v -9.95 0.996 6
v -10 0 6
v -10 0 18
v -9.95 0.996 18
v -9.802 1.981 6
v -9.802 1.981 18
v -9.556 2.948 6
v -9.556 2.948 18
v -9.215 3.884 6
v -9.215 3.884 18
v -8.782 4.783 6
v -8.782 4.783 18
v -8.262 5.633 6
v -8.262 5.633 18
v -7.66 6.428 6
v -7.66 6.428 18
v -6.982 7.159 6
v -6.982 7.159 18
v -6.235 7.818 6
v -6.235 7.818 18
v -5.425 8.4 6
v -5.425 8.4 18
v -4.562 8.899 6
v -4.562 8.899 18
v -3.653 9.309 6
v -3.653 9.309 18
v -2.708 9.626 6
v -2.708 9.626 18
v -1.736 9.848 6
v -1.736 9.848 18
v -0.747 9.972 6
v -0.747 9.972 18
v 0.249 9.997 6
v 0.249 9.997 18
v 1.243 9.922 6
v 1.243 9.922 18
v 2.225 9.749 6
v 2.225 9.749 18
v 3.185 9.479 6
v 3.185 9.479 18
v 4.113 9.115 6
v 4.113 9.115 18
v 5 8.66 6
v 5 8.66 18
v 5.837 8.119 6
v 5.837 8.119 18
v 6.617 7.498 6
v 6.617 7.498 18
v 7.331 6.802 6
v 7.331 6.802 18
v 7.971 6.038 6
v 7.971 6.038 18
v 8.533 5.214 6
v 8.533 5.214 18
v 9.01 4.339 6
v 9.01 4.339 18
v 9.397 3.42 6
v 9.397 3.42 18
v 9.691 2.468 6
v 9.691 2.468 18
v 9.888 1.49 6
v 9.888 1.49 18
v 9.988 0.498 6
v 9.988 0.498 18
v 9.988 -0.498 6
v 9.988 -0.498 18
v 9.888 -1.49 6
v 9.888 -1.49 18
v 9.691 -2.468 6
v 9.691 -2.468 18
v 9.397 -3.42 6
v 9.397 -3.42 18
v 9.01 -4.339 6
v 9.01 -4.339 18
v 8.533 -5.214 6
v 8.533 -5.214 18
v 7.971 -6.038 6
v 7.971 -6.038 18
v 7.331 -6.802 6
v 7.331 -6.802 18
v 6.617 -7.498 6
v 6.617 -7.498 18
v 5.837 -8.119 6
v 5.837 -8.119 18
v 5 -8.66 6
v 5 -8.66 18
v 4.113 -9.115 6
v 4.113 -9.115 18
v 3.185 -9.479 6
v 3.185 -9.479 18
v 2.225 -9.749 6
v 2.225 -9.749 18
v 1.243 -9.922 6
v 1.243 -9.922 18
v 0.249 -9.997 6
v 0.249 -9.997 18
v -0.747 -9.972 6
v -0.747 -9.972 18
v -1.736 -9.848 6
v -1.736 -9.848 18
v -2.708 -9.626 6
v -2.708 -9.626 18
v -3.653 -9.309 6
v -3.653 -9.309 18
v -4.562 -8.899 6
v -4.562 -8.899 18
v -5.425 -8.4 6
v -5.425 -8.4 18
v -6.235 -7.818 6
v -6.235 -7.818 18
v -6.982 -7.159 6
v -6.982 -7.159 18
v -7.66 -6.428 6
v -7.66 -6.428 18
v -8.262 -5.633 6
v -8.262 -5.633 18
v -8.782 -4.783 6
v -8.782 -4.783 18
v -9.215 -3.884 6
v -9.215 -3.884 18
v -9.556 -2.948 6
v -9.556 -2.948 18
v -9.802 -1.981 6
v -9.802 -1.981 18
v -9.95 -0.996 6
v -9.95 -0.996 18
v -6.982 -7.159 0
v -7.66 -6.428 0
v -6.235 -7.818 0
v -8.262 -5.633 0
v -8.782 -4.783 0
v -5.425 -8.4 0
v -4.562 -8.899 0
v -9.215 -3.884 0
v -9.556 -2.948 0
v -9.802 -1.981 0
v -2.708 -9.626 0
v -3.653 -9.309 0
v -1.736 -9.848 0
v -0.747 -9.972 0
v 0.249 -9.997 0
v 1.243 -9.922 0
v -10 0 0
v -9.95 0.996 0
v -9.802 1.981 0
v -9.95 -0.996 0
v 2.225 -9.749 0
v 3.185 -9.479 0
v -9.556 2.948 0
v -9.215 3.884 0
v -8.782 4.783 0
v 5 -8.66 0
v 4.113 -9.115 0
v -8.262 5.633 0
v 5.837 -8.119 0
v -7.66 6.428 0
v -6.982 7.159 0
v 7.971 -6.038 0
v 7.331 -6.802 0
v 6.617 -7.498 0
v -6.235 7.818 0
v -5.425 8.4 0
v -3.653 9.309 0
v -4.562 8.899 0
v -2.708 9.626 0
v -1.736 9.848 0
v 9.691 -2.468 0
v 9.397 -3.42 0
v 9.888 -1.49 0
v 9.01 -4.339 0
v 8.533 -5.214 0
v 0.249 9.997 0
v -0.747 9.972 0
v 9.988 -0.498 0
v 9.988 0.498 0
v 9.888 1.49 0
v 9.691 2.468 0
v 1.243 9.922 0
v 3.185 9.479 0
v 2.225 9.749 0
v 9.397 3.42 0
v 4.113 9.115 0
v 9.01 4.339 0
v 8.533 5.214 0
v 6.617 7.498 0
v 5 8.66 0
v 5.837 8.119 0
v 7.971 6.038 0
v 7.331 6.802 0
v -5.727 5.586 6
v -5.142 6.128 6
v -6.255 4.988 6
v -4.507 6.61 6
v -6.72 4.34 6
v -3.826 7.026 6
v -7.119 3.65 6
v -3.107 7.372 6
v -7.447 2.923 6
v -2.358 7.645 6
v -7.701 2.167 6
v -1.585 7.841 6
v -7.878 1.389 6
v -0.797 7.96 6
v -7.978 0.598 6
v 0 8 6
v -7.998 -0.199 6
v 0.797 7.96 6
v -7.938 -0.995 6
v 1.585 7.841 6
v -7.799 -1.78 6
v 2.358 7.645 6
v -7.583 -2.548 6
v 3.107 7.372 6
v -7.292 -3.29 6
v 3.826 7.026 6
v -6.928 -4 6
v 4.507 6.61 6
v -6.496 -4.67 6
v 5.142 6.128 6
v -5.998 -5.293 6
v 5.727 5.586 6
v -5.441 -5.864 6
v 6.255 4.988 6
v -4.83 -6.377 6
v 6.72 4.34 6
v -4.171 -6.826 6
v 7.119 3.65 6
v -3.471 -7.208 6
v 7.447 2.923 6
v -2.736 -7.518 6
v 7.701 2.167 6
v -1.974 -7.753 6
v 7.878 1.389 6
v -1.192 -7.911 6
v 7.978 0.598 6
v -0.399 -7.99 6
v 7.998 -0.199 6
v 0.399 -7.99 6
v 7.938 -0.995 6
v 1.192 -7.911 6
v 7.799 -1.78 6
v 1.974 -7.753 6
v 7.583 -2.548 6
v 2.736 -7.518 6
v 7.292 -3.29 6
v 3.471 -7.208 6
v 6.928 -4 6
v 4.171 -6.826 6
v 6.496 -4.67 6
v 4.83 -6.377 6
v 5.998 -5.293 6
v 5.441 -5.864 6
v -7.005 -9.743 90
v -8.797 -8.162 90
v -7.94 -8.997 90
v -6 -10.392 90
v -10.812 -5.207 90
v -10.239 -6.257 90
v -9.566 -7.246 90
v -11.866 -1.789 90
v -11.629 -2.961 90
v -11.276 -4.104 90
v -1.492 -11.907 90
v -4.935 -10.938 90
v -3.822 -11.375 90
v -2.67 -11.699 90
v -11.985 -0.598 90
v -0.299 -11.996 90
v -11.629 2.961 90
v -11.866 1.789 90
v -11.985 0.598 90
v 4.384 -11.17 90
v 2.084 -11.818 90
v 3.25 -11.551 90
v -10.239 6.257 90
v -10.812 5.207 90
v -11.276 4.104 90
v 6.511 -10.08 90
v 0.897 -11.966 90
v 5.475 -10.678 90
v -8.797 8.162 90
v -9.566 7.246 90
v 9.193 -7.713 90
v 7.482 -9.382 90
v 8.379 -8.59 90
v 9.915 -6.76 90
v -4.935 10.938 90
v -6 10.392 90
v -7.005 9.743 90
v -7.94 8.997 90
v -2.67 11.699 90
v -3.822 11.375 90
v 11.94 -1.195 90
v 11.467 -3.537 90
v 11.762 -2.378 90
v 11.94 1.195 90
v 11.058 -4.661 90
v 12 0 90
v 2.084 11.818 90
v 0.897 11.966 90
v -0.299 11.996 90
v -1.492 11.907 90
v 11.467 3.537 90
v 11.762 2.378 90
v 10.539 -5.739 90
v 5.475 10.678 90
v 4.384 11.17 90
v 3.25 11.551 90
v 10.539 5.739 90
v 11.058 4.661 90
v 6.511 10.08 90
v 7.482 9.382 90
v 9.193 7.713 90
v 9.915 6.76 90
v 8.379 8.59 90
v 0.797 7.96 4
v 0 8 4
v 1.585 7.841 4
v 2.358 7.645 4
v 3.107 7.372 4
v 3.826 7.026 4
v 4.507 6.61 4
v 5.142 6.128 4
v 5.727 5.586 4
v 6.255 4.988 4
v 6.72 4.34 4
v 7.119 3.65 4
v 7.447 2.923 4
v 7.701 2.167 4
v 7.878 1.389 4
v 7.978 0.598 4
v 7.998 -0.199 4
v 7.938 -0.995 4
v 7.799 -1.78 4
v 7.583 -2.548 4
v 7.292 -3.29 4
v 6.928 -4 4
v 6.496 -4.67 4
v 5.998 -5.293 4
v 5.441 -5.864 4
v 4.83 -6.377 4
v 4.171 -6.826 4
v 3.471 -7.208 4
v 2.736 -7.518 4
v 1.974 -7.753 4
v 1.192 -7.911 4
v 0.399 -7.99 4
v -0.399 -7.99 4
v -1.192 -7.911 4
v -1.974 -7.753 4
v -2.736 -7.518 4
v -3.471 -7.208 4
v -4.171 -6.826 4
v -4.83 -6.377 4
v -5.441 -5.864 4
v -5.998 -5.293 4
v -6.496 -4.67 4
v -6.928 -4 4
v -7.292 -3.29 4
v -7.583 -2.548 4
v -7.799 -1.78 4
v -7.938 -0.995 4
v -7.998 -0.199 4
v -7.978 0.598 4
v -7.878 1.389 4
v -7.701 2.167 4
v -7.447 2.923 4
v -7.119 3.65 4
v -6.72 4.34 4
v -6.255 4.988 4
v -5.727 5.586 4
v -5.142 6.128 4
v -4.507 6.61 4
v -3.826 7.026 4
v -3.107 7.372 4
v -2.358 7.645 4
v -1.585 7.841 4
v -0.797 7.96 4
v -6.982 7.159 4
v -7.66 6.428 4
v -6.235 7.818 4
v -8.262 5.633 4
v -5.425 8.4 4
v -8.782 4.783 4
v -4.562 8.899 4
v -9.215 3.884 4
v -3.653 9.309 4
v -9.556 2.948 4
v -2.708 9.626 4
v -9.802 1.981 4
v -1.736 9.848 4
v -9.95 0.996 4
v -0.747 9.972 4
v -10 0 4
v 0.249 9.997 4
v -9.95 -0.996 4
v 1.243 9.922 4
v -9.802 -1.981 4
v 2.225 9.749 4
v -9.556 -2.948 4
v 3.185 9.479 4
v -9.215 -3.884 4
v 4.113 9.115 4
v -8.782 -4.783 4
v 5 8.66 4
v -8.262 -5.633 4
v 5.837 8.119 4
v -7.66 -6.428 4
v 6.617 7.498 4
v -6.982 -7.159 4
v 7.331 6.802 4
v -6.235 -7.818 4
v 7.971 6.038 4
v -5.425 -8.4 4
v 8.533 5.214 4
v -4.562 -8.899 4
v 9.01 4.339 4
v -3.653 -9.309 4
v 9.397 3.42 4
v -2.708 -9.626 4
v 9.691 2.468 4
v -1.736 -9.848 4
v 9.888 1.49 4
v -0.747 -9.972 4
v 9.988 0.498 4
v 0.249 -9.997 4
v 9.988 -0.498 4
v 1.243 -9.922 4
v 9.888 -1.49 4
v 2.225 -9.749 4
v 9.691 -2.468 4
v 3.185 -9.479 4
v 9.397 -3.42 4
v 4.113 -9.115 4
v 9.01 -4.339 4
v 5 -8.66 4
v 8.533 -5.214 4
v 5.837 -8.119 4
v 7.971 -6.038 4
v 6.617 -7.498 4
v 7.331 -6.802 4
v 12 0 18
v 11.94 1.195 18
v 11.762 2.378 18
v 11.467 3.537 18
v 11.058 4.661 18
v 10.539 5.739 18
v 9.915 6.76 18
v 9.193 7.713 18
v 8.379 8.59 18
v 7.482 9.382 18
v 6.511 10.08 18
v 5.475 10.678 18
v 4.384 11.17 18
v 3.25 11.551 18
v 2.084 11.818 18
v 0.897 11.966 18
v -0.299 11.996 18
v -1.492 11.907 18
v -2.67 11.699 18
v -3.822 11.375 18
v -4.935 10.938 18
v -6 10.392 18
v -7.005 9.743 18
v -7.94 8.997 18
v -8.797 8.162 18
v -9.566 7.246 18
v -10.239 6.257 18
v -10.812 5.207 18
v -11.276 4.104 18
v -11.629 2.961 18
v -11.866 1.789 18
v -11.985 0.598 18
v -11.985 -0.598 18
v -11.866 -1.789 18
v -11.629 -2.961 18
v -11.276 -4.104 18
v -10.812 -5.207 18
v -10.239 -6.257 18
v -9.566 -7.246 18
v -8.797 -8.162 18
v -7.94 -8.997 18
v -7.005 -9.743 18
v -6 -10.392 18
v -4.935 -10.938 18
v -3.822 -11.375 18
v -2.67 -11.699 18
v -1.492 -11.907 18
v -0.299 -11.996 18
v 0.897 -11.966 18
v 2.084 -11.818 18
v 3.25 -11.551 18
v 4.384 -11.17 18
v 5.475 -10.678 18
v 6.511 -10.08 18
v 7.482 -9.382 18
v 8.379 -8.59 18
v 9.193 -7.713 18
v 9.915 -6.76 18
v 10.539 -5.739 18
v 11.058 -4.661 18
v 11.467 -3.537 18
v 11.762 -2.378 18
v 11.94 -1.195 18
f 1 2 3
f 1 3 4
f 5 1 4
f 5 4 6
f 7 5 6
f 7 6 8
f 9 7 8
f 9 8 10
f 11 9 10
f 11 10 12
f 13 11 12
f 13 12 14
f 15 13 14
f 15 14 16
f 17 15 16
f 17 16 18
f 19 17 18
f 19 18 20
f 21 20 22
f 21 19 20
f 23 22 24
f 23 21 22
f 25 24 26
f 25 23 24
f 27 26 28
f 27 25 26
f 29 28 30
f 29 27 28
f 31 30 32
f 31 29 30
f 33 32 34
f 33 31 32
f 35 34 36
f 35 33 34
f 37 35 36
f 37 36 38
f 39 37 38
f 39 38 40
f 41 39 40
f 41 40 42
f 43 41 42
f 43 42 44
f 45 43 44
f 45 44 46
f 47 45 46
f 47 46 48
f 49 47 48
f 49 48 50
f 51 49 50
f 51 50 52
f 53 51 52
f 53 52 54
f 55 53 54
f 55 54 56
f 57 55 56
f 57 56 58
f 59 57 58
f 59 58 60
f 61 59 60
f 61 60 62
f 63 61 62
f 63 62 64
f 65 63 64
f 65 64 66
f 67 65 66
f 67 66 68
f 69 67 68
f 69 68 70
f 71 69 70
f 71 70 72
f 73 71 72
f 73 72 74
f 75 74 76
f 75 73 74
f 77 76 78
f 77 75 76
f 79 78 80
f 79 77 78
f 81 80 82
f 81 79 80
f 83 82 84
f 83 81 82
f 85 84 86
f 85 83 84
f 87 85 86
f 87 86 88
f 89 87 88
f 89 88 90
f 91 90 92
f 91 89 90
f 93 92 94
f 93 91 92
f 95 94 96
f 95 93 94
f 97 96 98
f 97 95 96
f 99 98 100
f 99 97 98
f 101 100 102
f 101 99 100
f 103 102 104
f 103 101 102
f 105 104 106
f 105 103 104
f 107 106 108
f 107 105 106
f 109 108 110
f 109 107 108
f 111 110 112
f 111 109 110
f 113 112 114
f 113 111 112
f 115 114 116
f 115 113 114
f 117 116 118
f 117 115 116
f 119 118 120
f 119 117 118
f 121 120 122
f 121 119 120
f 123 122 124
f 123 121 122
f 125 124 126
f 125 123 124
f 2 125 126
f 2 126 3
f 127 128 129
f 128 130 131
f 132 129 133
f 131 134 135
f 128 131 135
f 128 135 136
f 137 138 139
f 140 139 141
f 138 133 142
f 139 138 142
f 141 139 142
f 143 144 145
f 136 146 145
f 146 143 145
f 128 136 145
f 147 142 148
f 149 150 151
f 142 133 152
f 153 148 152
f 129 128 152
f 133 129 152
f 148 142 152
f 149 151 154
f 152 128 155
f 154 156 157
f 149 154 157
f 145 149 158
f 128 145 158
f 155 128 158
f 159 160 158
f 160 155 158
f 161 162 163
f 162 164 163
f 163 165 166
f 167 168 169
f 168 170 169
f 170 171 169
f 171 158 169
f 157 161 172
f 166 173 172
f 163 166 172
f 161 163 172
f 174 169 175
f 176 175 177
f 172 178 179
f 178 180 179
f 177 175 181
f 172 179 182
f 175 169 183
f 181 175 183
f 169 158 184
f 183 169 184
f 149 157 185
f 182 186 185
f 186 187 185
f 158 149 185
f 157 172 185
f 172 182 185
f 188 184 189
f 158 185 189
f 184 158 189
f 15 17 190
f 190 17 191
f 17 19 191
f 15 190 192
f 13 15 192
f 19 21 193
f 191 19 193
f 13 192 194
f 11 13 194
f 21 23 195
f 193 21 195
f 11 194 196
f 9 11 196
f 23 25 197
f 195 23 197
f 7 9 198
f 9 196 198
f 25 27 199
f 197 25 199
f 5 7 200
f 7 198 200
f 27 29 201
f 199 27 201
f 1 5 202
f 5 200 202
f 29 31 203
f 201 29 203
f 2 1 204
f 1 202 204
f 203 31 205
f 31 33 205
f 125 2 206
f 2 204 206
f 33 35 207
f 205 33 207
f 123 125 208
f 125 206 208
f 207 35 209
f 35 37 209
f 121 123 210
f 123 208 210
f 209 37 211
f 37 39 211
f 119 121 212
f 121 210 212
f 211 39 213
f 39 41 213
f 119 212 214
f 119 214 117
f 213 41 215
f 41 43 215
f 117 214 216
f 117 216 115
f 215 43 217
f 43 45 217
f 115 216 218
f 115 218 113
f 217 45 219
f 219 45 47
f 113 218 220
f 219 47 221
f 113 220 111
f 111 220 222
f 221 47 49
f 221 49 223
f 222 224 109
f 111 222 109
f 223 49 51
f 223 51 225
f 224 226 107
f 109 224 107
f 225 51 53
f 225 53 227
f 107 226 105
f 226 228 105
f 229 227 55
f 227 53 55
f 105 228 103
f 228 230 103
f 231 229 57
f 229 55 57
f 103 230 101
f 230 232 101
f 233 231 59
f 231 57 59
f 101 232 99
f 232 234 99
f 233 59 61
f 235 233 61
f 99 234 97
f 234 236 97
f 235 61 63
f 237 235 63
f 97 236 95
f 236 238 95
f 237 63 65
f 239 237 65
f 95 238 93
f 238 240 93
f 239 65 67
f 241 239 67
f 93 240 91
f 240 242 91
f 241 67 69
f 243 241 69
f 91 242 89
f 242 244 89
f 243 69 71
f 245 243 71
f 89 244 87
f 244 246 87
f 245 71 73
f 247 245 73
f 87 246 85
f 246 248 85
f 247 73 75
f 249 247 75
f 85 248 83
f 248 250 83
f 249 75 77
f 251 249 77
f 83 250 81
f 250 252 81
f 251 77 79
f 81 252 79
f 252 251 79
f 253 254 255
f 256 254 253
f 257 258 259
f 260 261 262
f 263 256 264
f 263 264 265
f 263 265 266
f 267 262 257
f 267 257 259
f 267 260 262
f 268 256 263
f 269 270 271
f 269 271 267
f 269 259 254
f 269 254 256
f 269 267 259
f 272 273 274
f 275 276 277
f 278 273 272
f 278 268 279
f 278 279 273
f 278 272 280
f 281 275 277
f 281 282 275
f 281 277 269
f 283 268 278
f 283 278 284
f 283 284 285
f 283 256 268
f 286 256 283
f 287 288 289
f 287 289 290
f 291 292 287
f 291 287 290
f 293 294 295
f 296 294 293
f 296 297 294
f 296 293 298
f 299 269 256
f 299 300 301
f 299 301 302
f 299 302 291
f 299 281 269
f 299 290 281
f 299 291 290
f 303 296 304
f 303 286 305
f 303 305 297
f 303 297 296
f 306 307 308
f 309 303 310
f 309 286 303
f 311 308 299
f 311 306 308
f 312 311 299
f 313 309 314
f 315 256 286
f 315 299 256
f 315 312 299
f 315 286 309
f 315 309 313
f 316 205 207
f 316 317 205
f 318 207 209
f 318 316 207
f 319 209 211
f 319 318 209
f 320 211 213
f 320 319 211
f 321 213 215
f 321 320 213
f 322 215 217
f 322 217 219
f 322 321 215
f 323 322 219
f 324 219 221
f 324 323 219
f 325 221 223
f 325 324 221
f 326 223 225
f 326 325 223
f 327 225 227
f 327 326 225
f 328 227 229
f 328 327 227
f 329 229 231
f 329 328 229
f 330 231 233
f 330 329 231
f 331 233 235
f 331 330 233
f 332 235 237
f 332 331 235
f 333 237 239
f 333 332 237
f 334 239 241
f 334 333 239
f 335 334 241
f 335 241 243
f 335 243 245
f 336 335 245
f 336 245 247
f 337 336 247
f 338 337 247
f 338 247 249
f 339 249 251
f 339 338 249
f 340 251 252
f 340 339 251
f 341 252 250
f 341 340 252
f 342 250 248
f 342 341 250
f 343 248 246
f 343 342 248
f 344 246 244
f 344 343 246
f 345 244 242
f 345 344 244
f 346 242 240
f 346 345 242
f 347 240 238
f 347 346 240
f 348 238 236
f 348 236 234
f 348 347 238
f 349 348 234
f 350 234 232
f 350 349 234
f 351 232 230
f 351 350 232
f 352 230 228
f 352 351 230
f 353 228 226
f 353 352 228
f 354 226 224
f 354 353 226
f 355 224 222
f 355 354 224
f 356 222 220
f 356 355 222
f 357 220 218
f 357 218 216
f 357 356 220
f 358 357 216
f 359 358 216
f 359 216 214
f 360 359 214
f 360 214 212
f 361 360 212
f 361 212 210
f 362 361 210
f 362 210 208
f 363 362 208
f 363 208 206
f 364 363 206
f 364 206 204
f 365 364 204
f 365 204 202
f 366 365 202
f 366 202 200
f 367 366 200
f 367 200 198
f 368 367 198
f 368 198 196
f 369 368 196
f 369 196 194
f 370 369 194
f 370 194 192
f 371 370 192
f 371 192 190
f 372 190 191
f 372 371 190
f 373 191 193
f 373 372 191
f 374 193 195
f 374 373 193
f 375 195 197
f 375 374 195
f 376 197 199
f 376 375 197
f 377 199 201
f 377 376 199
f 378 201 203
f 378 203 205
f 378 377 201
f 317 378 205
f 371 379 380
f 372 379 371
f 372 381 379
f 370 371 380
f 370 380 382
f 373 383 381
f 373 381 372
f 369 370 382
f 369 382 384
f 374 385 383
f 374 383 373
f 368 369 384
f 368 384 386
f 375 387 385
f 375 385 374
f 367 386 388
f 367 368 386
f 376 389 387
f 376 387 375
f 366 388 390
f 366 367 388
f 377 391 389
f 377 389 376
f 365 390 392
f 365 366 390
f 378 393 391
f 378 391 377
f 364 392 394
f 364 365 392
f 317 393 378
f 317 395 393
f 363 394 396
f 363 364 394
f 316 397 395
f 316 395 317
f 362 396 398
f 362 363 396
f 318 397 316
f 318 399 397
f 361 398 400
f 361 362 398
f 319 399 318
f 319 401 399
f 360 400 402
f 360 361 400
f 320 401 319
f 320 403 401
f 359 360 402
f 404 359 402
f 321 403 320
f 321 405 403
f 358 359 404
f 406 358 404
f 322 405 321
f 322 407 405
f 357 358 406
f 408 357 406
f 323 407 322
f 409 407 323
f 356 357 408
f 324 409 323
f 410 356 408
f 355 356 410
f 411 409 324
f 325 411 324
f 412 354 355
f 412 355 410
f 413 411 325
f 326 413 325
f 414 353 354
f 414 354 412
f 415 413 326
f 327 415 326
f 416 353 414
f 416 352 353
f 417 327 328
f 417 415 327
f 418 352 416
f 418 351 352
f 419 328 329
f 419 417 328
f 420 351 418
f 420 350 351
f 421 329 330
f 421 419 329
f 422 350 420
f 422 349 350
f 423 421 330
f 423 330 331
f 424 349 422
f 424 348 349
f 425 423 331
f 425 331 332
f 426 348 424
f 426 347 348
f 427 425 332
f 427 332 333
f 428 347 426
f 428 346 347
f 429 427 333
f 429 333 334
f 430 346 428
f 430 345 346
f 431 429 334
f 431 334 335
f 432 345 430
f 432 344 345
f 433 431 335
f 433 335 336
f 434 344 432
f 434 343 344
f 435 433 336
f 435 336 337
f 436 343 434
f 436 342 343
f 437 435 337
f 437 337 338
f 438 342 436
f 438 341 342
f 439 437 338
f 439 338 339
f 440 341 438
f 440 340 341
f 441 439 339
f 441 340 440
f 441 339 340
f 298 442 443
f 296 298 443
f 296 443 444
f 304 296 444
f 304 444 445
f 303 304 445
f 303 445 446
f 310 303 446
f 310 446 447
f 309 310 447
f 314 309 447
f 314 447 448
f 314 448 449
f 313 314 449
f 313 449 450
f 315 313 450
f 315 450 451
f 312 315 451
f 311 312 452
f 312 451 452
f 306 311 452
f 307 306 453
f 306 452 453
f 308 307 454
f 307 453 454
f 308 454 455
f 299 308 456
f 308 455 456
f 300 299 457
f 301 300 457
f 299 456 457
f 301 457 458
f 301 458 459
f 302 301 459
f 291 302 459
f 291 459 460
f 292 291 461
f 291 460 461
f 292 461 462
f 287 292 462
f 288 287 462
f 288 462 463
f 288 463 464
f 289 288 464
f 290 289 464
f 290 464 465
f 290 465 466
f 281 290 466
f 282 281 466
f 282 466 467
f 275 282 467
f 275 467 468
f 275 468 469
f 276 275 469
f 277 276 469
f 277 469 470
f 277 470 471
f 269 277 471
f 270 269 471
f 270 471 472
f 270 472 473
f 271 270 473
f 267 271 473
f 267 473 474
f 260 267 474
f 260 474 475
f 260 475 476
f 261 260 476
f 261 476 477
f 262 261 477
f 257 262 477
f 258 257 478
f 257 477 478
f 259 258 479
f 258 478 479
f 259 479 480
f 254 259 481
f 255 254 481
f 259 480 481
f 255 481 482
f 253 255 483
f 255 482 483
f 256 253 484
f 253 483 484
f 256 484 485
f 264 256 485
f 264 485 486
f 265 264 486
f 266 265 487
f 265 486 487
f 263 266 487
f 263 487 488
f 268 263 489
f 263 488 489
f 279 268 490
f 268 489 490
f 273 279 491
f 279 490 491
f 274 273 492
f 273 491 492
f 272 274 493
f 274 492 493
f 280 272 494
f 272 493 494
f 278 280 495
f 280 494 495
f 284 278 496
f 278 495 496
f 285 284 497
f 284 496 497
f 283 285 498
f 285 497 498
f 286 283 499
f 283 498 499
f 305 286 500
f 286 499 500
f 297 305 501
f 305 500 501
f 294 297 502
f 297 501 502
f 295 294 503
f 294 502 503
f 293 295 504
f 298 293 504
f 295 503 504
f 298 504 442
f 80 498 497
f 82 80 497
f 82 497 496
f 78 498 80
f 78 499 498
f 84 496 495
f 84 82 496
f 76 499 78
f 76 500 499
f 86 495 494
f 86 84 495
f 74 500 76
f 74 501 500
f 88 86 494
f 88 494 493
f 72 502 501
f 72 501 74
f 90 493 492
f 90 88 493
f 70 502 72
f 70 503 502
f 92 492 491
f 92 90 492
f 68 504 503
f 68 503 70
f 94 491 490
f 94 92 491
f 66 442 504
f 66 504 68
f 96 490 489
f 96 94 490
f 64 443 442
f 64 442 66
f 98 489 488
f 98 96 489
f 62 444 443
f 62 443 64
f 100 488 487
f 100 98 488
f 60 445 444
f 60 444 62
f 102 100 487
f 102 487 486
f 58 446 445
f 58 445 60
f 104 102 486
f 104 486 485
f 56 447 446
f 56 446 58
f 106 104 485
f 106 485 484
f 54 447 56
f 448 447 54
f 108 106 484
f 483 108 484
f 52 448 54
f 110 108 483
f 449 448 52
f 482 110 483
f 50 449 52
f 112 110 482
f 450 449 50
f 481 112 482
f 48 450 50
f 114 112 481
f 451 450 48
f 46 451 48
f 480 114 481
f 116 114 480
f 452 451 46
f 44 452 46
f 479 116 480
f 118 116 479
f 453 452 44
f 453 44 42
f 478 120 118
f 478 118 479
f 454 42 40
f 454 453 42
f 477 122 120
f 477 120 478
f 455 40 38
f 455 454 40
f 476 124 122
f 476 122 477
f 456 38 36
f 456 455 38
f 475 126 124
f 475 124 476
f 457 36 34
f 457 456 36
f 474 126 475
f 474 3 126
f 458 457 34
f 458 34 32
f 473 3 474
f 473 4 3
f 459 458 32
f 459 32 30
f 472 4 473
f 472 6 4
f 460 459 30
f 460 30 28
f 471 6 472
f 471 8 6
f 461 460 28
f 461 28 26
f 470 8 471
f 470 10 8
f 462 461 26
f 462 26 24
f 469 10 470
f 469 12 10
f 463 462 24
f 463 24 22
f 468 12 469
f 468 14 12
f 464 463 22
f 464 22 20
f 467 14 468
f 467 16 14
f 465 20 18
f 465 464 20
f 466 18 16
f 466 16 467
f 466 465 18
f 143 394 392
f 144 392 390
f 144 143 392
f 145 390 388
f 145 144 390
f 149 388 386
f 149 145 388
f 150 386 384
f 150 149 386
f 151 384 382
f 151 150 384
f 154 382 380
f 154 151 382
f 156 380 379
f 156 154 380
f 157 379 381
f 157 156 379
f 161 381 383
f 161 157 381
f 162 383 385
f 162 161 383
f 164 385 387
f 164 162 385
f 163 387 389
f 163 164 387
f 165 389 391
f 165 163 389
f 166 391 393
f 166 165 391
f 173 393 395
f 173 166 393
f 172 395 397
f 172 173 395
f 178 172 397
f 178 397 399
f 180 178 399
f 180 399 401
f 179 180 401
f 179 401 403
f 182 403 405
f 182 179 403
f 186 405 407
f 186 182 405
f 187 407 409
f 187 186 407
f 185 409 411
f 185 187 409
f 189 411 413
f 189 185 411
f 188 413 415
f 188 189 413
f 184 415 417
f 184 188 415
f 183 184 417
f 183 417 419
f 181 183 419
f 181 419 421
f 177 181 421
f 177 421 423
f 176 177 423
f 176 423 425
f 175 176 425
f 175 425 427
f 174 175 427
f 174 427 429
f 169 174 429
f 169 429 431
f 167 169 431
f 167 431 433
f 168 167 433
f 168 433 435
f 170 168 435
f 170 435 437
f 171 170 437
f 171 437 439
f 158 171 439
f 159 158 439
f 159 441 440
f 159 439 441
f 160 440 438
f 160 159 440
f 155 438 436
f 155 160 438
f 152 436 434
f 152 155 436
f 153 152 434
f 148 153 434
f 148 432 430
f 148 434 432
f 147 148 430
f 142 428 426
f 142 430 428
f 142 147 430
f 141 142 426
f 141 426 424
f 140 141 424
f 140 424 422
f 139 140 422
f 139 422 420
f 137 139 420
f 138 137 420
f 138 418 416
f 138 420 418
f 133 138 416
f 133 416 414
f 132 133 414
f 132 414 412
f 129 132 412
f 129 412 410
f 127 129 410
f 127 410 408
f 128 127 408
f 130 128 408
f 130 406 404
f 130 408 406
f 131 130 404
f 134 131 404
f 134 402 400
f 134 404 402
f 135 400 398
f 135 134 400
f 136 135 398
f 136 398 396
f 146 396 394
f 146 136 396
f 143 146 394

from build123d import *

# Parameters (mm, degrees)
SKETCH1_R           = 12
BOSS_EXTRUDE1_DEPTH = 90
SKETCH2_R           = 12
SKETCH2_R_2         = 10
CUT_EXTRUDE2_DEPTH  = 18
SKETCH3_W           = 2
SKETCH3_H           = 2


with BuildPart() as part:
    # Sketch1 → Boss-Extrude1 (new body)
    with BuildSketch(Plane.XY):
        Circle(SKETCH1_R)
    extrude(amount=BOSS_EXTRUDE1_DEPTH)

    # Sketch2 → Cut-Extrude2 (cut)
    with BuildSketch(Plane(origin=(0, 0, 0), x_dir=(-1, 0, 0), z_dir=(0, 0, -1))):
        Circle(SKETCH2_R)
        Circle(SKETCH2_R_2, mode=Mode.SUBTRACT)
    extrude(amount=-CUT_EXTRUDE2_DEPTH, mode=Mode.SUBTRACT)

    # Sketch3 → Cut-Revolve1 (revolve, cut)
    with BuildSketch(Plane(origin=(0, 0, 0), x_dir=(0, 0, -1), z_dir=(1, 0, 0))):
        with Locations((-5, 9)):
            Rectangle(SKETCH3_W, SKETCH3_H)
    revolve(axis=Axis((0, 0, 18), (0, 0, -1)), mode=Mode.SUBTRACT)


solid = part.part
